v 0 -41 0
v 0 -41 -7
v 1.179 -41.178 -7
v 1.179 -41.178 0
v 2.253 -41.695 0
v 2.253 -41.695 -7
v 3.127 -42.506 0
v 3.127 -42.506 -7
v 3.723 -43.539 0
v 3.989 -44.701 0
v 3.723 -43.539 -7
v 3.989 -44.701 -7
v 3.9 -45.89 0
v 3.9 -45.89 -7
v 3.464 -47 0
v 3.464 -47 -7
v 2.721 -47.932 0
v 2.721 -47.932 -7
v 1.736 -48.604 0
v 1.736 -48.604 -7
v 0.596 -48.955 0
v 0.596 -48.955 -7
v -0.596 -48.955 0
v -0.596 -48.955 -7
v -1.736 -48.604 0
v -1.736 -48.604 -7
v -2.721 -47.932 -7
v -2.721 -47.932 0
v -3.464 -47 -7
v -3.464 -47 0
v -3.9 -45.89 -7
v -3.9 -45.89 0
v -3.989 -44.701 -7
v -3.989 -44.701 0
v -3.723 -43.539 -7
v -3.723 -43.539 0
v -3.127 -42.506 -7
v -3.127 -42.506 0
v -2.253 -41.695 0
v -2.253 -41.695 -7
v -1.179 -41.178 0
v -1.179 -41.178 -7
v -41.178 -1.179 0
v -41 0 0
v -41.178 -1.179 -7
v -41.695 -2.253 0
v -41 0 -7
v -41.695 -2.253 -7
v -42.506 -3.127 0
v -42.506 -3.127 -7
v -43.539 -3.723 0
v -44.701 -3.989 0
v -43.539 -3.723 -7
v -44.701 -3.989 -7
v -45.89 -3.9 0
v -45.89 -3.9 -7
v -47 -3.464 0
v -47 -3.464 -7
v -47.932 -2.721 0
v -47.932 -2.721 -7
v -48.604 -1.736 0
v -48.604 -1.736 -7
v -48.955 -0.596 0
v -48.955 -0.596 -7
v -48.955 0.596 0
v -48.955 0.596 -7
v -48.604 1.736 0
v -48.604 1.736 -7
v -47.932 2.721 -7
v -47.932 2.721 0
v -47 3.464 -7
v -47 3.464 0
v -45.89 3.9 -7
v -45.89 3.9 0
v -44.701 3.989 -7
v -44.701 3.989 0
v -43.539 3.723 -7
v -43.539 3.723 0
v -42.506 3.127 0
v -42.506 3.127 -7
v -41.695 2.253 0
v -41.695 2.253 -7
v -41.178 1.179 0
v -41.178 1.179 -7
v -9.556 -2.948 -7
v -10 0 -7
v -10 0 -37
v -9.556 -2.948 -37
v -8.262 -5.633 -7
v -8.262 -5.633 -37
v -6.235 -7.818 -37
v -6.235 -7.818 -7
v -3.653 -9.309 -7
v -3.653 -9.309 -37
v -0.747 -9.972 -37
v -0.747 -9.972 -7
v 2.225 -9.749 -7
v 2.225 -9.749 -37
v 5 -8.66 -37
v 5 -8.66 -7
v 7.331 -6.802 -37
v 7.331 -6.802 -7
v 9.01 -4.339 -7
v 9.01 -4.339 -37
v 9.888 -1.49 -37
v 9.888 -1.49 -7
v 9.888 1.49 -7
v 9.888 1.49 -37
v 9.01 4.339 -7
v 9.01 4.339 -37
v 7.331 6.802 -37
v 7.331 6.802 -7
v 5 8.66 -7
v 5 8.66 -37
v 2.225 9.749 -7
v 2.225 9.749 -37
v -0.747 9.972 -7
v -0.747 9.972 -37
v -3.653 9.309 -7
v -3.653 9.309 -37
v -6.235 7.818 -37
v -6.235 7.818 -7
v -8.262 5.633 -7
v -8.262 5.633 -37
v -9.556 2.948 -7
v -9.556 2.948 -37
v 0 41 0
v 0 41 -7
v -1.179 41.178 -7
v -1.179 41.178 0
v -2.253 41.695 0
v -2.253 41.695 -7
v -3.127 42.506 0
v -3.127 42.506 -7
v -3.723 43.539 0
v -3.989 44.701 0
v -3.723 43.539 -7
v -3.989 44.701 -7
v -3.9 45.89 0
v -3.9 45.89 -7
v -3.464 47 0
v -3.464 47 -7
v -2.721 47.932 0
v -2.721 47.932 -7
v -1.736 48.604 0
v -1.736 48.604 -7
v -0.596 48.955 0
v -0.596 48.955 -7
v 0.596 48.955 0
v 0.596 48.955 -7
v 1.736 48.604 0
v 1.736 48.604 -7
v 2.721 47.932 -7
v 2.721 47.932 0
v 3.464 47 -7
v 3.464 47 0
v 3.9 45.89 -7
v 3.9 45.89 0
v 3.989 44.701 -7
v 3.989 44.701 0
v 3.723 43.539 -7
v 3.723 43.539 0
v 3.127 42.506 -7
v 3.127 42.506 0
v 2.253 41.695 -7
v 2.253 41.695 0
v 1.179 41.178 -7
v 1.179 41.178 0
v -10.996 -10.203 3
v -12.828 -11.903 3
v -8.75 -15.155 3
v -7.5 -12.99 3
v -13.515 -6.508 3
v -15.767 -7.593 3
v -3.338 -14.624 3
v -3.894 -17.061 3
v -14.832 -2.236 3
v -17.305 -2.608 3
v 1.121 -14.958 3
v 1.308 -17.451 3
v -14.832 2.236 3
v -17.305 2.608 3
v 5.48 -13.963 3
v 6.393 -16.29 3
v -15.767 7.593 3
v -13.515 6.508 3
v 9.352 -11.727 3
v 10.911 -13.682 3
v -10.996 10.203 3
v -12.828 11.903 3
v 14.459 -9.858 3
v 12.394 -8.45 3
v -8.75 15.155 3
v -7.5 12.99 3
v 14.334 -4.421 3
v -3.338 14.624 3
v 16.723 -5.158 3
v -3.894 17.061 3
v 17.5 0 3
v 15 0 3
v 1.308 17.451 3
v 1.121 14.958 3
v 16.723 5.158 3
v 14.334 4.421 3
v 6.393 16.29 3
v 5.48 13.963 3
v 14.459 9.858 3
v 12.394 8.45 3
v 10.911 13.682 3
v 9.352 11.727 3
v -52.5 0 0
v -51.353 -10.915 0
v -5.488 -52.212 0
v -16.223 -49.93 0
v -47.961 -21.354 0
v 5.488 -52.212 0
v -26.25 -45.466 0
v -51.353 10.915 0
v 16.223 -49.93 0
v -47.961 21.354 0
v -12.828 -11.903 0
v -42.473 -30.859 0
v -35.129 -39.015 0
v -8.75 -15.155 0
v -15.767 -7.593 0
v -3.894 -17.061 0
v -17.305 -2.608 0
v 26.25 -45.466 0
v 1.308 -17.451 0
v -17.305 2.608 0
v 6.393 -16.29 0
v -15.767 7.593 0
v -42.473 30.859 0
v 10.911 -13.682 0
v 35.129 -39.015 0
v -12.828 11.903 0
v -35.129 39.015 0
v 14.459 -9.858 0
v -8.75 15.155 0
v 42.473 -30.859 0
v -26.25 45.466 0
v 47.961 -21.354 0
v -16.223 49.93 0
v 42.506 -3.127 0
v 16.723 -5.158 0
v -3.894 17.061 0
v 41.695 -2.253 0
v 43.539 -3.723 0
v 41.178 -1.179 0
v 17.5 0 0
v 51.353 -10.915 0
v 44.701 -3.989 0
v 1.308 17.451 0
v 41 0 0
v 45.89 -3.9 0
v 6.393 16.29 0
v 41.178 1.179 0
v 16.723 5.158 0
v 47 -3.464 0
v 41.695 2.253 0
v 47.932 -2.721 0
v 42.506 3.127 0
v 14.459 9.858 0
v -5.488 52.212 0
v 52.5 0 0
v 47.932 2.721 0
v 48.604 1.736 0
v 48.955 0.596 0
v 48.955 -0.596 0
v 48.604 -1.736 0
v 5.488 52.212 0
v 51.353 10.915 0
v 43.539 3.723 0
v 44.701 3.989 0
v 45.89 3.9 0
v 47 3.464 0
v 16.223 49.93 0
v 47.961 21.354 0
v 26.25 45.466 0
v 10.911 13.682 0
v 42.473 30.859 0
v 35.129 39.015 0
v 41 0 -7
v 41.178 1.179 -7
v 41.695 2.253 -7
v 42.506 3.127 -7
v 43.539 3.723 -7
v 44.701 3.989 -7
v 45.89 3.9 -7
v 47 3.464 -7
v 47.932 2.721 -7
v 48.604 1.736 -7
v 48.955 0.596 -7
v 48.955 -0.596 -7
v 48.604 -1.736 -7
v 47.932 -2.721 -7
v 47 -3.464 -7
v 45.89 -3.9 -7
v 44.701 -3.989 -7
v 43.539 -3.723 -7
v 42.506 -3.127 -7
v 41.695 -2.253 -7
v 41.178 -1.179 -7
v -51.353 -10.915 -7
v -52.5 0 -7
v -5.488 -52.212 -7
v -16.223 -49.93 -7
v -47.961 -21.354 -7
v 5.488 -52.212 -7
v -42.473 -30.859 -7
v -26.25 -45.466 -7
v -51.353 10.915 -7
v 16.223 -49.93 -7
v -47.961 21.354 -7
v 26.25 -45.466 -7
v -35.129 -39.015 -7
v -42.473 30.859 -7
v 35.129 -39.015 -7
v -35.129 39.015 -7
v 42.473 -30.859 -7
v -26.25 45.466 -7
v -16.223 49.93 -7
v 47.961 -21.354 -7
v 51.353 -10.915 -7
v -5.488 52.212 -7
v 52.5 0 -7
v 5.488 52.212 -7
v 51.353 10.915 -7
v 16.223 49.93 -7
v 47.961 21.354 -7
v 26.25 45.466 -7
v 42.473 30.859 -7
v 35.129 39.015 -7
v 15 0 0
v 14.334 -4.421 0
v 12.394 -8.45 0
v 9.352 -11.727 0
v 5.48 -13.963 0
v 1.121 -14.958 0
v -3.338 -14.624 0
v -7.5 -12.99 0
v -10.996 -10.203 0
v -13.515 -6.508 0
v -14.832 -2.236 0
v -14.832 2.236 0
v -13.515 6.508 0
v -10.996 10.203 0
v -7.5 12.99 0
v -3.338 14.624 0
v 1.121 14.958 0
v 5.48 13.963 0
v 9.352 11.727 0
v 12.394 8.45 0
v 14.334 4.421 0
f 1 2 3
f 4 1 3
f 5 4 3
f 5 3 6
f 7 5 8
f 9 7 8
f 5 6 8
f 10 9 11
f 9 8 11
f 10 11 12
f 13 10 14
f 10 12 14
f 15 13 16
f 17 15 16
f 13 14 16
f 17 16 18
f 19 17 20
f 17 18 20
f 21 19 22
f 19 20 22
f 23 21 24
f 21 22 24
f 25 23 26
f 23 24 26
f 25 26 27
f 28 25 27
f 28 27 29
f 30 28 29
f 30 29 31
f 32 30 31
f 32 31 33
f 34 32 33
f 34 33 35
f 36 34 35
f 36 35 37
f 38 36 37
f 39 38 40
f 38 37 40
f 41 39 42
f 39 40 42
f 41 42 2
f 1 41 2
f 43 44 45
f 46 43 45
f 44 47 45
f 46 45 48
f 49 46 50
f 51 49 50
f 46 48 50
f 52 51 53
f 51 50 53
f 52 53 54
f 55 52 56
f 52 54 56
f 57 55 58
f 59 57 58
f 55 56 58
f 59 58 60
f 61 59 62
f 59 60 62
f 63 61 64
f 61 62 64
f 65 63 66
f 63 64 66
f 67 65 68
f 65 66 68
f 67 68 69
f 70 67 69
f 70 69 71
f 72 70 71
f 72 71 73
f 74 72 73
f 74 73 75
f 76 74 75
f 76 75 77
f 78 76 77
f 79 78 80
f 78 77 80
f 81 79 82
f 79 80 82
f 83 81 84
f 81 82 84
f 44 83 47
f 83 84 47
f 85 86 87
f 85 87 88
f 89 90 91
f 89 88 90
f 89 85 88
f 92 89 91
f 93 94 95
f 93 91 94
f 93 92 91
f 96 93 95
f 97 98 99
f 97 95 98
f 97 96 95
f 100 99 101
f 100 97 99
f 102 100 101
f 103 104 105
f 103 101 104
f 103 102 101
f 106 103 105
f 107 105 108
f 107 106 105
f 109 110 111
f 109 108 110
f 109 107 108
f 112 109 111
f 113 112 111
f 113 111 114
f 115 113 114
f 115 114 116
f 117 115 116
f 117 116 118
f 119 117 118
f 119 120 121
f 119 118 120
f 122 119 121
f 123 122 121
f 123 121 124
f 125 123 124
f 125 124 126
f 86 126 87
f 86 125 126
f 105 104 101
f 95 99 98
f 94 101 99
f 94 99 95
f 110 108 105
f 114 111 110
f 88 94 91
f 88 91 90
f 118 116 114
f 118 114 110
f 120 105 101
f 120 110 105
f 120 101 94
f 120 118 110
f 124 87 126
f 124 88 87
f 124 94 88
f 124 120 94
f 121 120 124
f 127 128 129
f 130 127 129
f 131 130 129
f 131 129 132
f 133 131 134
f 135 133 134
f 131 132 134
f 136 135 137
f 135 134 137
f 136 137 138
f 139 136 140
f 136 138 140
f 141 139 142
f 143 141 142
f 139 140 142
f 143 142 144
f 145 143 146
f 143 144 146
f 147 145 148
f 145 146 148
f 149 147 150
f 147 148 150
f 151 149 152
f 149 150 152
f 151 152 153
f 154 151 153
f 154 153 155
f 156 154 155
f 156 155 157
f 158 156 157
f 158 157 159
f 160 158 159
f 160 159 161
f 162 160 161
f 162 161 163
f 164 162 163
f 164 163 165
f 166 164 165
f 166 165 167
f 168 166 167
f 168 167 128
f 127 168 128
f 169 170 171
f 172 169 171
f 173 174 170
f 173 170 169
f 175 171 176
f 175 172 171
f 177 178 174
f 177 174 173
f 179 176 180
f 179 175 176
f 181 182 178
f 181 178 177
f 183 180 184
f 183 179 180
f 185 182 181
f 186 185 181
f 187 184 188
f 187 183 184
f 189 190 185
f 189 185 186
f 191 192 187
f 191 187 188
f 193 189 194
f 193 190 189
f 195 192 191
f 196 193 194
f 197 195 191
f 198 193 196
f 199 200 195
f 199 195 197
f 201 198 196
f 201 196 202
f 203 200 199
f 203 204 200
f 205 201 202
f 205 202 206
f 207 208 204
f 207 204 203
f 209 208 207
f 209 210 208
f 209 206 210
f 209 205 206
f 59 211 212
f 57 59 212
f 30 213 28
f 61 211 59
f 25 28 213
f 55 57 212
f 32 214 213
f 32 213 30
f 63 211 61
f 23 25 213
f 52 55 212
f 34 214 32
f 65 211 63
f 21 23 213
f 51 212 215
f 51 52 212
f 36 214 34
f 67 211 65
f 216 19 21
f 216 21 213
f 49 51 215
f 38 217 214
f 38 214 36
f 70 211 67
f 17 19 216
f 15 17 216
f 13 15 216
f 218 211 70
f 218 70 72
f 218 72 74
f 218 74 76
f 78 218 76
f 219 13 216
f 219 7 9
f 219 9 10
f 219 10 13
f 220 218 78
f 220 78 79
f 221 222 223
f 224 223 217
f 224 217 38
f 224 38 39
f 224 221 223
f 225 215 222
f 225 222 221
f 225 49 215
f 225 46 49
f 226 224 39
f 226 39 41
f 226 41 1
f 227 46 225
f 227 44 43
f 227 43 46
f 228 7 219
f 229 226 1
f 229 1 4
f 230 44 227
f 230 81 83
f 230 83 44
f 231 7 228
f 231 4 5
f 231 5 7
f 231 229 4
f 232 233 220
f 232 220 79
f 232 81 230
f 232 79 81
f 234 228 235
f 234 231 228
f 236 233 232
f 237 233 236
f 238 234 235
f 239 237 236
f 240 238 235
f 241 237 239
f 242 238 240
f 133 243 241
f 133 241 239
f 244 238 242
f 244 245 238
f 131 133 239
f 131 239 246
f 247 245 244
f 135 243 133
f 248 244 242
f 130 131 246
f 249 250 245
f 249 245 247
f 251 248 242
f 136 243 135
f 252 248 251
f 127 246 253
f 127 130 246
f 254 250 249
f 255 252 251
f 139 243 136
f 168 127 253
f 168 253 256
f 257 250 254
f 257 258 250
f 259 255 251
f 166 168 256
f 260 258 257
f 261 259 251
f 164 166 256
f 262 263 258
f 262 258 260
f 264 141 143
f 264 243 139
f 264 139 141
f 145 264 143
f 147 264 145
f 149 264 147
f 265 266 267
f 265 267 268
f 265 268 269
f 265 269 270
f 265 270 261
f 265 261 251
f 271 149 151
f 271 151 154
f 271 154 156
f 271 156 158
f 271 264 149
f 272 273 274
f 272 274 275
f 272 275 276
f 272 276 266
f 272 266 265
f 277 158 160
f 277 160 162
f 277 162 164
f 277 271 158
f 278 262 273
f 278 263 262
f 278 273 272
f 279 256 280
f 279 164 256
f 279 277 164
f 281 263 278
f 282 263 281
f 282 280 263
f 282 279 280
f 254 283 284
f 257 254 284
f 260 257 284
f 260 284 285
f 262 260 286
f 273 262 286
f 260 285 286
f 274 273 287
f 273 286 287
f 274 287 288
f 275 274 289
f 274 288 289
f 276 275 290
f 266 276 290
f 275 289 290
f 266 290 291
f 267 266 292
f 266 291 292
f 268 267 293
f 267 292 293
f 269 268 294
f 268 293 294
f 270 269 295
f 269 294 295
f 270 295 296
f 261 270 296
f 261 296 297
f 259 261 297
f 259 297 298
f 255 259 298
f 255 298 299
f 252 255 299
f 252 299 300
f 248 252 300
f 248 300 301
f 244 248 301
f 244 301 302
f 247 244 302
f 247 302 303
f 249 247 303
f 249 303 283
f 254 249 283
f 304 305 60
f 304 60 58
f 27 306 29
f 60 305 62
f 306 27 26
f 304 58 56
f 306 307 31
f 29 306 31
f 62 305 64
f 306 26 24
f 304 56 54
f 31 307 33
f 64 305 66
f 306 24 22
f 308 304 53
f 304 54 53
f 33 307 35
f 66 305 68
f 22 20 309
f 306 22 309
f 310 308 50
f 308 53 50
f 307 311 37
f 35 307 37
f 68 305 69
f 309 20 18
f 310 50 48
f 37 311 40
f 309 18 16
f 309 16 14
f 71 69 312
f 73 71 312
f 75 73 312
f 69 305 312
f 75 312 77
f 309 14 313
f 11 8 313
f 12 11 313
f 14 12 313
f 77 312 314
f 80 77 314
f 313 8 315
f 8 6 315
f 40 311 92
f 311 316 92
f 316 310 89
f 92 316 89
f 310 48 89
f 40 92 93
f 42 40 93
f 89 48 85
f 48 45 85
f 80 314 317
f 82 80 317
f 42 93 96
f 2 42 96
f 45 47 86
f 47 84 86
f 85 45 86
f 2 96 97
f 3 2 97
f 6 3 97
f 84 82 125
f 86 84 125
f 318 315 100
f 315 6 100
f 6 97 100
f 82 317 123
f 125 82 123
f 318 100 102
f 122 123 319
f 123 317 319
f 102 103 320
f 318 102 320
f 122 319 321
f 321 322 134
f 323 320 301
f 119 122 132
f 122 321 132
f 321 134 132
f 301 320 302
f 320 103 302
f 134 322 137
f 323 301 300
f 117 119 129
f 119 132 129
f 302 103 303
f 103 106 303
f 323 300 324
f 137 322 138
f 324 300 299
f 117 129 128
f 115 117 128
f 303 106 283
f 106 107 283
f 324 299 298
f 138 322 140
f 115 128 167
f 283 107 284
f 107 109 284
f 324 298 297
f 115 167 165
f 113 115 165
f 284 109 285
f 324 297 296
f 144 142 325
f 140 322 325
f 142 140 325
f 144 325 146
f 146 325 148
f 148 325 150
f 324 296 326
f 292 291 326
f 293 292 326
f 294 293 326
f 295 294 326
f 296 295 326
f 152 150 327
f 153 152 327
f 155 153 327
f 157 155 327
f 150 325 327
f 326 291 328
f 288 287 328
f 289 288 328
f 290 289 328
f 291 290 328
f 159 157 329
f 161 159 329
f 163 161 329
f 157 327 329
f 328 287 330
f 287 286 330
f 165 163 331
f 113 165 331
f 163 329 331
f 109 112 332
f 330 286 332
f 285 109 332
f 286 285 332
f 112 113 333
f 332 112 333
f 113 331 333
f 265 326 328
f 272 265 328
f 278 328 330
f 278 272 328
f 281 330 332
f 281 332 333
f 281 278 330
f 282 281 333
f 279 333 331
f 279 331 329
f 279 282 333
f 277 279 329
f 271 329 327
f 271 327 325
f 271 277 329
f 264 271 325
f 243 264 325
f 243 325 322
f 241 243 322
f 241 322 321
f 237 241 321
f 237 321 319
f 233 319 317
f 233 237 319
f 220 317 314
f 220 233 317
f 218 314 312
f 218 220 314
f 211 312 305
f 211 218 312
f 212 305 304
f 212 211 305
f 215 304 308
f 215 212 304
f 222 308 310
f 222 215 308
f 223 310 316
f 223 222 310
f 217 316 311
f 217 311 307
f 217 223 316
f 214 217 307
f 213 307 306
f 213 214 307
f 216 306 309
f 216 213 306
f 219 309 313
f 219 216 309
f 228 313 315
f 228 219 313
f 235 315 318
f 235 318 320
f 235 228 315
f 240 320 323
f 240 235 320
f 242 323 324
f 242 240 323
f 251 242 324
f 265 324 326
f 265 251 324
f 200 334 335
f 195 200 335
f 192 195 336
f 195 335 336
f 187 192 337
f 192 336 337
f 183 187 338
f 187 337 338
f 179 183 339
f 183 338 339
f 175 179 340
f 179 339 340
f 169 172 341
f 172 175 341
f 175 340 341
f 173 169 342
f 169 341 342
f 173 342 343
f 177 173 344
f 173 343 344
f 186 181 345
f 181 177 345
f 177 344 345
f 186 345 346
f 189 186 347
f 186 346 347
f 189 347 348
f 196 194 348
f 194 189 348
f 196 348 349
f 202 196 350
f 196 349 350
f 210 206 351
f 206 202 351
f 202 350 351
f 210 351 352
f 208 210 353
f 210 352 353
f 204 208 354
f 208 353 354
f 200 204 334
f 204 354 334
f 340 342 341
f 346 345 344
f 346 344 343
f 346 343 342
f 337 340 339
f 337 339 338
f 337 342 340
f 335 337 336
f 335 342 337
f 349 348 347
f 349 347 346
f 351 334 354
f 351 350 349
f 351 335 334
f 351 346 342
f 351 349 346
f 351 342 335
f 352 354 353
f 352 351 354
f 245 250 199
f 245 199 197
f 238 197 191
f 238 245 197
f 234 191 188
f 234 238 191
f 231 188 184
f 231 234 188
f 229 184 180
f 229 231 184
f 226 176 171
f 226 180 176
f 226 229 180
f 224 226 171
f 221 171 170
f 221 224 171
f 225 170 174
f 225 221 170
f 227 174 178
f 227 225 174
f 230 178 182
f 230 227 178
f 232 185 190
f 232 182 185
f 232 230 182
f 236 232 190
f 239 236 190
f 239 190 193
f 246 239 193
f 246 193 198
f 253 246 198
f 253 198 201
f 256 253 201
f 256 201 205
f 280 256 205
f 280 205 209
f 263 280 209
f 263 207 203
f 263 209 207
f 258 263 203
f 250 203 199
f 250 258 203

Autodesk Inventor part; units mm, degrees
ref_plane "YZ Plane" through (0, 0, 0) normal (1, 0, 0) x (0, 1, 0)
ref_plane "XZ Plane" through (0, 0, 0) normal (0, 1, 0) x (-1, 0, 0)
ref_plane "XY Plane" through (0, 0, 0) normal (0, 0, 1) x (1, 0, 0)
sketch "Sketch1" plane through (0, 0, 0) normal (0, 0, 1) x (1, 0, 0)
  circle A0 centre (0, 0) radius 52.5
  dimension "d0" = 105
extrude "Extrusion1" add sketch "Sketch1" against normal blind 7
sketch "Sketch2" plane through (0, 0, 0) normal (0, 0, 1) x (1, 0, 0)
  circle A0 centre (0, 0) radius 45 construction
  line L0 (0, 0) -> (0, 45) construction
  dimension "d3" = 90
hole "Hole1" at (0, 45, 0) direction (0, 0, -1) diameter 8 depth 7
pattern_circular "Circular Pattern1" count 4 over 360 about axis through (0, 0, -10) along (0, 0, 1) of "Hole1"
sketch "Sketch3" plane through (0, 0, -7) normal (0, 0, -1) x (-1, 0, 0)
  circle A0 centre (0, 0) radius 10
  dimension "d14" = 20
extrude "Extrusion2" add sketch "Sketch3" along normal blind 30
sketch "Sketch4" plane through (0, 0, 0) normal (0, 0, 1) x (1, 0, 0)
  circle A0 centre (0, 0) radius 15
  circle A1 centre (0, 0) radius 17.5
  dimension "d17" = 35
  dimension "d18" = 30
extrude "Extrusion3" add sketch "Sketch4" along normal blind 3
properties part number "Diff_Driveshaft_Output_V1"
